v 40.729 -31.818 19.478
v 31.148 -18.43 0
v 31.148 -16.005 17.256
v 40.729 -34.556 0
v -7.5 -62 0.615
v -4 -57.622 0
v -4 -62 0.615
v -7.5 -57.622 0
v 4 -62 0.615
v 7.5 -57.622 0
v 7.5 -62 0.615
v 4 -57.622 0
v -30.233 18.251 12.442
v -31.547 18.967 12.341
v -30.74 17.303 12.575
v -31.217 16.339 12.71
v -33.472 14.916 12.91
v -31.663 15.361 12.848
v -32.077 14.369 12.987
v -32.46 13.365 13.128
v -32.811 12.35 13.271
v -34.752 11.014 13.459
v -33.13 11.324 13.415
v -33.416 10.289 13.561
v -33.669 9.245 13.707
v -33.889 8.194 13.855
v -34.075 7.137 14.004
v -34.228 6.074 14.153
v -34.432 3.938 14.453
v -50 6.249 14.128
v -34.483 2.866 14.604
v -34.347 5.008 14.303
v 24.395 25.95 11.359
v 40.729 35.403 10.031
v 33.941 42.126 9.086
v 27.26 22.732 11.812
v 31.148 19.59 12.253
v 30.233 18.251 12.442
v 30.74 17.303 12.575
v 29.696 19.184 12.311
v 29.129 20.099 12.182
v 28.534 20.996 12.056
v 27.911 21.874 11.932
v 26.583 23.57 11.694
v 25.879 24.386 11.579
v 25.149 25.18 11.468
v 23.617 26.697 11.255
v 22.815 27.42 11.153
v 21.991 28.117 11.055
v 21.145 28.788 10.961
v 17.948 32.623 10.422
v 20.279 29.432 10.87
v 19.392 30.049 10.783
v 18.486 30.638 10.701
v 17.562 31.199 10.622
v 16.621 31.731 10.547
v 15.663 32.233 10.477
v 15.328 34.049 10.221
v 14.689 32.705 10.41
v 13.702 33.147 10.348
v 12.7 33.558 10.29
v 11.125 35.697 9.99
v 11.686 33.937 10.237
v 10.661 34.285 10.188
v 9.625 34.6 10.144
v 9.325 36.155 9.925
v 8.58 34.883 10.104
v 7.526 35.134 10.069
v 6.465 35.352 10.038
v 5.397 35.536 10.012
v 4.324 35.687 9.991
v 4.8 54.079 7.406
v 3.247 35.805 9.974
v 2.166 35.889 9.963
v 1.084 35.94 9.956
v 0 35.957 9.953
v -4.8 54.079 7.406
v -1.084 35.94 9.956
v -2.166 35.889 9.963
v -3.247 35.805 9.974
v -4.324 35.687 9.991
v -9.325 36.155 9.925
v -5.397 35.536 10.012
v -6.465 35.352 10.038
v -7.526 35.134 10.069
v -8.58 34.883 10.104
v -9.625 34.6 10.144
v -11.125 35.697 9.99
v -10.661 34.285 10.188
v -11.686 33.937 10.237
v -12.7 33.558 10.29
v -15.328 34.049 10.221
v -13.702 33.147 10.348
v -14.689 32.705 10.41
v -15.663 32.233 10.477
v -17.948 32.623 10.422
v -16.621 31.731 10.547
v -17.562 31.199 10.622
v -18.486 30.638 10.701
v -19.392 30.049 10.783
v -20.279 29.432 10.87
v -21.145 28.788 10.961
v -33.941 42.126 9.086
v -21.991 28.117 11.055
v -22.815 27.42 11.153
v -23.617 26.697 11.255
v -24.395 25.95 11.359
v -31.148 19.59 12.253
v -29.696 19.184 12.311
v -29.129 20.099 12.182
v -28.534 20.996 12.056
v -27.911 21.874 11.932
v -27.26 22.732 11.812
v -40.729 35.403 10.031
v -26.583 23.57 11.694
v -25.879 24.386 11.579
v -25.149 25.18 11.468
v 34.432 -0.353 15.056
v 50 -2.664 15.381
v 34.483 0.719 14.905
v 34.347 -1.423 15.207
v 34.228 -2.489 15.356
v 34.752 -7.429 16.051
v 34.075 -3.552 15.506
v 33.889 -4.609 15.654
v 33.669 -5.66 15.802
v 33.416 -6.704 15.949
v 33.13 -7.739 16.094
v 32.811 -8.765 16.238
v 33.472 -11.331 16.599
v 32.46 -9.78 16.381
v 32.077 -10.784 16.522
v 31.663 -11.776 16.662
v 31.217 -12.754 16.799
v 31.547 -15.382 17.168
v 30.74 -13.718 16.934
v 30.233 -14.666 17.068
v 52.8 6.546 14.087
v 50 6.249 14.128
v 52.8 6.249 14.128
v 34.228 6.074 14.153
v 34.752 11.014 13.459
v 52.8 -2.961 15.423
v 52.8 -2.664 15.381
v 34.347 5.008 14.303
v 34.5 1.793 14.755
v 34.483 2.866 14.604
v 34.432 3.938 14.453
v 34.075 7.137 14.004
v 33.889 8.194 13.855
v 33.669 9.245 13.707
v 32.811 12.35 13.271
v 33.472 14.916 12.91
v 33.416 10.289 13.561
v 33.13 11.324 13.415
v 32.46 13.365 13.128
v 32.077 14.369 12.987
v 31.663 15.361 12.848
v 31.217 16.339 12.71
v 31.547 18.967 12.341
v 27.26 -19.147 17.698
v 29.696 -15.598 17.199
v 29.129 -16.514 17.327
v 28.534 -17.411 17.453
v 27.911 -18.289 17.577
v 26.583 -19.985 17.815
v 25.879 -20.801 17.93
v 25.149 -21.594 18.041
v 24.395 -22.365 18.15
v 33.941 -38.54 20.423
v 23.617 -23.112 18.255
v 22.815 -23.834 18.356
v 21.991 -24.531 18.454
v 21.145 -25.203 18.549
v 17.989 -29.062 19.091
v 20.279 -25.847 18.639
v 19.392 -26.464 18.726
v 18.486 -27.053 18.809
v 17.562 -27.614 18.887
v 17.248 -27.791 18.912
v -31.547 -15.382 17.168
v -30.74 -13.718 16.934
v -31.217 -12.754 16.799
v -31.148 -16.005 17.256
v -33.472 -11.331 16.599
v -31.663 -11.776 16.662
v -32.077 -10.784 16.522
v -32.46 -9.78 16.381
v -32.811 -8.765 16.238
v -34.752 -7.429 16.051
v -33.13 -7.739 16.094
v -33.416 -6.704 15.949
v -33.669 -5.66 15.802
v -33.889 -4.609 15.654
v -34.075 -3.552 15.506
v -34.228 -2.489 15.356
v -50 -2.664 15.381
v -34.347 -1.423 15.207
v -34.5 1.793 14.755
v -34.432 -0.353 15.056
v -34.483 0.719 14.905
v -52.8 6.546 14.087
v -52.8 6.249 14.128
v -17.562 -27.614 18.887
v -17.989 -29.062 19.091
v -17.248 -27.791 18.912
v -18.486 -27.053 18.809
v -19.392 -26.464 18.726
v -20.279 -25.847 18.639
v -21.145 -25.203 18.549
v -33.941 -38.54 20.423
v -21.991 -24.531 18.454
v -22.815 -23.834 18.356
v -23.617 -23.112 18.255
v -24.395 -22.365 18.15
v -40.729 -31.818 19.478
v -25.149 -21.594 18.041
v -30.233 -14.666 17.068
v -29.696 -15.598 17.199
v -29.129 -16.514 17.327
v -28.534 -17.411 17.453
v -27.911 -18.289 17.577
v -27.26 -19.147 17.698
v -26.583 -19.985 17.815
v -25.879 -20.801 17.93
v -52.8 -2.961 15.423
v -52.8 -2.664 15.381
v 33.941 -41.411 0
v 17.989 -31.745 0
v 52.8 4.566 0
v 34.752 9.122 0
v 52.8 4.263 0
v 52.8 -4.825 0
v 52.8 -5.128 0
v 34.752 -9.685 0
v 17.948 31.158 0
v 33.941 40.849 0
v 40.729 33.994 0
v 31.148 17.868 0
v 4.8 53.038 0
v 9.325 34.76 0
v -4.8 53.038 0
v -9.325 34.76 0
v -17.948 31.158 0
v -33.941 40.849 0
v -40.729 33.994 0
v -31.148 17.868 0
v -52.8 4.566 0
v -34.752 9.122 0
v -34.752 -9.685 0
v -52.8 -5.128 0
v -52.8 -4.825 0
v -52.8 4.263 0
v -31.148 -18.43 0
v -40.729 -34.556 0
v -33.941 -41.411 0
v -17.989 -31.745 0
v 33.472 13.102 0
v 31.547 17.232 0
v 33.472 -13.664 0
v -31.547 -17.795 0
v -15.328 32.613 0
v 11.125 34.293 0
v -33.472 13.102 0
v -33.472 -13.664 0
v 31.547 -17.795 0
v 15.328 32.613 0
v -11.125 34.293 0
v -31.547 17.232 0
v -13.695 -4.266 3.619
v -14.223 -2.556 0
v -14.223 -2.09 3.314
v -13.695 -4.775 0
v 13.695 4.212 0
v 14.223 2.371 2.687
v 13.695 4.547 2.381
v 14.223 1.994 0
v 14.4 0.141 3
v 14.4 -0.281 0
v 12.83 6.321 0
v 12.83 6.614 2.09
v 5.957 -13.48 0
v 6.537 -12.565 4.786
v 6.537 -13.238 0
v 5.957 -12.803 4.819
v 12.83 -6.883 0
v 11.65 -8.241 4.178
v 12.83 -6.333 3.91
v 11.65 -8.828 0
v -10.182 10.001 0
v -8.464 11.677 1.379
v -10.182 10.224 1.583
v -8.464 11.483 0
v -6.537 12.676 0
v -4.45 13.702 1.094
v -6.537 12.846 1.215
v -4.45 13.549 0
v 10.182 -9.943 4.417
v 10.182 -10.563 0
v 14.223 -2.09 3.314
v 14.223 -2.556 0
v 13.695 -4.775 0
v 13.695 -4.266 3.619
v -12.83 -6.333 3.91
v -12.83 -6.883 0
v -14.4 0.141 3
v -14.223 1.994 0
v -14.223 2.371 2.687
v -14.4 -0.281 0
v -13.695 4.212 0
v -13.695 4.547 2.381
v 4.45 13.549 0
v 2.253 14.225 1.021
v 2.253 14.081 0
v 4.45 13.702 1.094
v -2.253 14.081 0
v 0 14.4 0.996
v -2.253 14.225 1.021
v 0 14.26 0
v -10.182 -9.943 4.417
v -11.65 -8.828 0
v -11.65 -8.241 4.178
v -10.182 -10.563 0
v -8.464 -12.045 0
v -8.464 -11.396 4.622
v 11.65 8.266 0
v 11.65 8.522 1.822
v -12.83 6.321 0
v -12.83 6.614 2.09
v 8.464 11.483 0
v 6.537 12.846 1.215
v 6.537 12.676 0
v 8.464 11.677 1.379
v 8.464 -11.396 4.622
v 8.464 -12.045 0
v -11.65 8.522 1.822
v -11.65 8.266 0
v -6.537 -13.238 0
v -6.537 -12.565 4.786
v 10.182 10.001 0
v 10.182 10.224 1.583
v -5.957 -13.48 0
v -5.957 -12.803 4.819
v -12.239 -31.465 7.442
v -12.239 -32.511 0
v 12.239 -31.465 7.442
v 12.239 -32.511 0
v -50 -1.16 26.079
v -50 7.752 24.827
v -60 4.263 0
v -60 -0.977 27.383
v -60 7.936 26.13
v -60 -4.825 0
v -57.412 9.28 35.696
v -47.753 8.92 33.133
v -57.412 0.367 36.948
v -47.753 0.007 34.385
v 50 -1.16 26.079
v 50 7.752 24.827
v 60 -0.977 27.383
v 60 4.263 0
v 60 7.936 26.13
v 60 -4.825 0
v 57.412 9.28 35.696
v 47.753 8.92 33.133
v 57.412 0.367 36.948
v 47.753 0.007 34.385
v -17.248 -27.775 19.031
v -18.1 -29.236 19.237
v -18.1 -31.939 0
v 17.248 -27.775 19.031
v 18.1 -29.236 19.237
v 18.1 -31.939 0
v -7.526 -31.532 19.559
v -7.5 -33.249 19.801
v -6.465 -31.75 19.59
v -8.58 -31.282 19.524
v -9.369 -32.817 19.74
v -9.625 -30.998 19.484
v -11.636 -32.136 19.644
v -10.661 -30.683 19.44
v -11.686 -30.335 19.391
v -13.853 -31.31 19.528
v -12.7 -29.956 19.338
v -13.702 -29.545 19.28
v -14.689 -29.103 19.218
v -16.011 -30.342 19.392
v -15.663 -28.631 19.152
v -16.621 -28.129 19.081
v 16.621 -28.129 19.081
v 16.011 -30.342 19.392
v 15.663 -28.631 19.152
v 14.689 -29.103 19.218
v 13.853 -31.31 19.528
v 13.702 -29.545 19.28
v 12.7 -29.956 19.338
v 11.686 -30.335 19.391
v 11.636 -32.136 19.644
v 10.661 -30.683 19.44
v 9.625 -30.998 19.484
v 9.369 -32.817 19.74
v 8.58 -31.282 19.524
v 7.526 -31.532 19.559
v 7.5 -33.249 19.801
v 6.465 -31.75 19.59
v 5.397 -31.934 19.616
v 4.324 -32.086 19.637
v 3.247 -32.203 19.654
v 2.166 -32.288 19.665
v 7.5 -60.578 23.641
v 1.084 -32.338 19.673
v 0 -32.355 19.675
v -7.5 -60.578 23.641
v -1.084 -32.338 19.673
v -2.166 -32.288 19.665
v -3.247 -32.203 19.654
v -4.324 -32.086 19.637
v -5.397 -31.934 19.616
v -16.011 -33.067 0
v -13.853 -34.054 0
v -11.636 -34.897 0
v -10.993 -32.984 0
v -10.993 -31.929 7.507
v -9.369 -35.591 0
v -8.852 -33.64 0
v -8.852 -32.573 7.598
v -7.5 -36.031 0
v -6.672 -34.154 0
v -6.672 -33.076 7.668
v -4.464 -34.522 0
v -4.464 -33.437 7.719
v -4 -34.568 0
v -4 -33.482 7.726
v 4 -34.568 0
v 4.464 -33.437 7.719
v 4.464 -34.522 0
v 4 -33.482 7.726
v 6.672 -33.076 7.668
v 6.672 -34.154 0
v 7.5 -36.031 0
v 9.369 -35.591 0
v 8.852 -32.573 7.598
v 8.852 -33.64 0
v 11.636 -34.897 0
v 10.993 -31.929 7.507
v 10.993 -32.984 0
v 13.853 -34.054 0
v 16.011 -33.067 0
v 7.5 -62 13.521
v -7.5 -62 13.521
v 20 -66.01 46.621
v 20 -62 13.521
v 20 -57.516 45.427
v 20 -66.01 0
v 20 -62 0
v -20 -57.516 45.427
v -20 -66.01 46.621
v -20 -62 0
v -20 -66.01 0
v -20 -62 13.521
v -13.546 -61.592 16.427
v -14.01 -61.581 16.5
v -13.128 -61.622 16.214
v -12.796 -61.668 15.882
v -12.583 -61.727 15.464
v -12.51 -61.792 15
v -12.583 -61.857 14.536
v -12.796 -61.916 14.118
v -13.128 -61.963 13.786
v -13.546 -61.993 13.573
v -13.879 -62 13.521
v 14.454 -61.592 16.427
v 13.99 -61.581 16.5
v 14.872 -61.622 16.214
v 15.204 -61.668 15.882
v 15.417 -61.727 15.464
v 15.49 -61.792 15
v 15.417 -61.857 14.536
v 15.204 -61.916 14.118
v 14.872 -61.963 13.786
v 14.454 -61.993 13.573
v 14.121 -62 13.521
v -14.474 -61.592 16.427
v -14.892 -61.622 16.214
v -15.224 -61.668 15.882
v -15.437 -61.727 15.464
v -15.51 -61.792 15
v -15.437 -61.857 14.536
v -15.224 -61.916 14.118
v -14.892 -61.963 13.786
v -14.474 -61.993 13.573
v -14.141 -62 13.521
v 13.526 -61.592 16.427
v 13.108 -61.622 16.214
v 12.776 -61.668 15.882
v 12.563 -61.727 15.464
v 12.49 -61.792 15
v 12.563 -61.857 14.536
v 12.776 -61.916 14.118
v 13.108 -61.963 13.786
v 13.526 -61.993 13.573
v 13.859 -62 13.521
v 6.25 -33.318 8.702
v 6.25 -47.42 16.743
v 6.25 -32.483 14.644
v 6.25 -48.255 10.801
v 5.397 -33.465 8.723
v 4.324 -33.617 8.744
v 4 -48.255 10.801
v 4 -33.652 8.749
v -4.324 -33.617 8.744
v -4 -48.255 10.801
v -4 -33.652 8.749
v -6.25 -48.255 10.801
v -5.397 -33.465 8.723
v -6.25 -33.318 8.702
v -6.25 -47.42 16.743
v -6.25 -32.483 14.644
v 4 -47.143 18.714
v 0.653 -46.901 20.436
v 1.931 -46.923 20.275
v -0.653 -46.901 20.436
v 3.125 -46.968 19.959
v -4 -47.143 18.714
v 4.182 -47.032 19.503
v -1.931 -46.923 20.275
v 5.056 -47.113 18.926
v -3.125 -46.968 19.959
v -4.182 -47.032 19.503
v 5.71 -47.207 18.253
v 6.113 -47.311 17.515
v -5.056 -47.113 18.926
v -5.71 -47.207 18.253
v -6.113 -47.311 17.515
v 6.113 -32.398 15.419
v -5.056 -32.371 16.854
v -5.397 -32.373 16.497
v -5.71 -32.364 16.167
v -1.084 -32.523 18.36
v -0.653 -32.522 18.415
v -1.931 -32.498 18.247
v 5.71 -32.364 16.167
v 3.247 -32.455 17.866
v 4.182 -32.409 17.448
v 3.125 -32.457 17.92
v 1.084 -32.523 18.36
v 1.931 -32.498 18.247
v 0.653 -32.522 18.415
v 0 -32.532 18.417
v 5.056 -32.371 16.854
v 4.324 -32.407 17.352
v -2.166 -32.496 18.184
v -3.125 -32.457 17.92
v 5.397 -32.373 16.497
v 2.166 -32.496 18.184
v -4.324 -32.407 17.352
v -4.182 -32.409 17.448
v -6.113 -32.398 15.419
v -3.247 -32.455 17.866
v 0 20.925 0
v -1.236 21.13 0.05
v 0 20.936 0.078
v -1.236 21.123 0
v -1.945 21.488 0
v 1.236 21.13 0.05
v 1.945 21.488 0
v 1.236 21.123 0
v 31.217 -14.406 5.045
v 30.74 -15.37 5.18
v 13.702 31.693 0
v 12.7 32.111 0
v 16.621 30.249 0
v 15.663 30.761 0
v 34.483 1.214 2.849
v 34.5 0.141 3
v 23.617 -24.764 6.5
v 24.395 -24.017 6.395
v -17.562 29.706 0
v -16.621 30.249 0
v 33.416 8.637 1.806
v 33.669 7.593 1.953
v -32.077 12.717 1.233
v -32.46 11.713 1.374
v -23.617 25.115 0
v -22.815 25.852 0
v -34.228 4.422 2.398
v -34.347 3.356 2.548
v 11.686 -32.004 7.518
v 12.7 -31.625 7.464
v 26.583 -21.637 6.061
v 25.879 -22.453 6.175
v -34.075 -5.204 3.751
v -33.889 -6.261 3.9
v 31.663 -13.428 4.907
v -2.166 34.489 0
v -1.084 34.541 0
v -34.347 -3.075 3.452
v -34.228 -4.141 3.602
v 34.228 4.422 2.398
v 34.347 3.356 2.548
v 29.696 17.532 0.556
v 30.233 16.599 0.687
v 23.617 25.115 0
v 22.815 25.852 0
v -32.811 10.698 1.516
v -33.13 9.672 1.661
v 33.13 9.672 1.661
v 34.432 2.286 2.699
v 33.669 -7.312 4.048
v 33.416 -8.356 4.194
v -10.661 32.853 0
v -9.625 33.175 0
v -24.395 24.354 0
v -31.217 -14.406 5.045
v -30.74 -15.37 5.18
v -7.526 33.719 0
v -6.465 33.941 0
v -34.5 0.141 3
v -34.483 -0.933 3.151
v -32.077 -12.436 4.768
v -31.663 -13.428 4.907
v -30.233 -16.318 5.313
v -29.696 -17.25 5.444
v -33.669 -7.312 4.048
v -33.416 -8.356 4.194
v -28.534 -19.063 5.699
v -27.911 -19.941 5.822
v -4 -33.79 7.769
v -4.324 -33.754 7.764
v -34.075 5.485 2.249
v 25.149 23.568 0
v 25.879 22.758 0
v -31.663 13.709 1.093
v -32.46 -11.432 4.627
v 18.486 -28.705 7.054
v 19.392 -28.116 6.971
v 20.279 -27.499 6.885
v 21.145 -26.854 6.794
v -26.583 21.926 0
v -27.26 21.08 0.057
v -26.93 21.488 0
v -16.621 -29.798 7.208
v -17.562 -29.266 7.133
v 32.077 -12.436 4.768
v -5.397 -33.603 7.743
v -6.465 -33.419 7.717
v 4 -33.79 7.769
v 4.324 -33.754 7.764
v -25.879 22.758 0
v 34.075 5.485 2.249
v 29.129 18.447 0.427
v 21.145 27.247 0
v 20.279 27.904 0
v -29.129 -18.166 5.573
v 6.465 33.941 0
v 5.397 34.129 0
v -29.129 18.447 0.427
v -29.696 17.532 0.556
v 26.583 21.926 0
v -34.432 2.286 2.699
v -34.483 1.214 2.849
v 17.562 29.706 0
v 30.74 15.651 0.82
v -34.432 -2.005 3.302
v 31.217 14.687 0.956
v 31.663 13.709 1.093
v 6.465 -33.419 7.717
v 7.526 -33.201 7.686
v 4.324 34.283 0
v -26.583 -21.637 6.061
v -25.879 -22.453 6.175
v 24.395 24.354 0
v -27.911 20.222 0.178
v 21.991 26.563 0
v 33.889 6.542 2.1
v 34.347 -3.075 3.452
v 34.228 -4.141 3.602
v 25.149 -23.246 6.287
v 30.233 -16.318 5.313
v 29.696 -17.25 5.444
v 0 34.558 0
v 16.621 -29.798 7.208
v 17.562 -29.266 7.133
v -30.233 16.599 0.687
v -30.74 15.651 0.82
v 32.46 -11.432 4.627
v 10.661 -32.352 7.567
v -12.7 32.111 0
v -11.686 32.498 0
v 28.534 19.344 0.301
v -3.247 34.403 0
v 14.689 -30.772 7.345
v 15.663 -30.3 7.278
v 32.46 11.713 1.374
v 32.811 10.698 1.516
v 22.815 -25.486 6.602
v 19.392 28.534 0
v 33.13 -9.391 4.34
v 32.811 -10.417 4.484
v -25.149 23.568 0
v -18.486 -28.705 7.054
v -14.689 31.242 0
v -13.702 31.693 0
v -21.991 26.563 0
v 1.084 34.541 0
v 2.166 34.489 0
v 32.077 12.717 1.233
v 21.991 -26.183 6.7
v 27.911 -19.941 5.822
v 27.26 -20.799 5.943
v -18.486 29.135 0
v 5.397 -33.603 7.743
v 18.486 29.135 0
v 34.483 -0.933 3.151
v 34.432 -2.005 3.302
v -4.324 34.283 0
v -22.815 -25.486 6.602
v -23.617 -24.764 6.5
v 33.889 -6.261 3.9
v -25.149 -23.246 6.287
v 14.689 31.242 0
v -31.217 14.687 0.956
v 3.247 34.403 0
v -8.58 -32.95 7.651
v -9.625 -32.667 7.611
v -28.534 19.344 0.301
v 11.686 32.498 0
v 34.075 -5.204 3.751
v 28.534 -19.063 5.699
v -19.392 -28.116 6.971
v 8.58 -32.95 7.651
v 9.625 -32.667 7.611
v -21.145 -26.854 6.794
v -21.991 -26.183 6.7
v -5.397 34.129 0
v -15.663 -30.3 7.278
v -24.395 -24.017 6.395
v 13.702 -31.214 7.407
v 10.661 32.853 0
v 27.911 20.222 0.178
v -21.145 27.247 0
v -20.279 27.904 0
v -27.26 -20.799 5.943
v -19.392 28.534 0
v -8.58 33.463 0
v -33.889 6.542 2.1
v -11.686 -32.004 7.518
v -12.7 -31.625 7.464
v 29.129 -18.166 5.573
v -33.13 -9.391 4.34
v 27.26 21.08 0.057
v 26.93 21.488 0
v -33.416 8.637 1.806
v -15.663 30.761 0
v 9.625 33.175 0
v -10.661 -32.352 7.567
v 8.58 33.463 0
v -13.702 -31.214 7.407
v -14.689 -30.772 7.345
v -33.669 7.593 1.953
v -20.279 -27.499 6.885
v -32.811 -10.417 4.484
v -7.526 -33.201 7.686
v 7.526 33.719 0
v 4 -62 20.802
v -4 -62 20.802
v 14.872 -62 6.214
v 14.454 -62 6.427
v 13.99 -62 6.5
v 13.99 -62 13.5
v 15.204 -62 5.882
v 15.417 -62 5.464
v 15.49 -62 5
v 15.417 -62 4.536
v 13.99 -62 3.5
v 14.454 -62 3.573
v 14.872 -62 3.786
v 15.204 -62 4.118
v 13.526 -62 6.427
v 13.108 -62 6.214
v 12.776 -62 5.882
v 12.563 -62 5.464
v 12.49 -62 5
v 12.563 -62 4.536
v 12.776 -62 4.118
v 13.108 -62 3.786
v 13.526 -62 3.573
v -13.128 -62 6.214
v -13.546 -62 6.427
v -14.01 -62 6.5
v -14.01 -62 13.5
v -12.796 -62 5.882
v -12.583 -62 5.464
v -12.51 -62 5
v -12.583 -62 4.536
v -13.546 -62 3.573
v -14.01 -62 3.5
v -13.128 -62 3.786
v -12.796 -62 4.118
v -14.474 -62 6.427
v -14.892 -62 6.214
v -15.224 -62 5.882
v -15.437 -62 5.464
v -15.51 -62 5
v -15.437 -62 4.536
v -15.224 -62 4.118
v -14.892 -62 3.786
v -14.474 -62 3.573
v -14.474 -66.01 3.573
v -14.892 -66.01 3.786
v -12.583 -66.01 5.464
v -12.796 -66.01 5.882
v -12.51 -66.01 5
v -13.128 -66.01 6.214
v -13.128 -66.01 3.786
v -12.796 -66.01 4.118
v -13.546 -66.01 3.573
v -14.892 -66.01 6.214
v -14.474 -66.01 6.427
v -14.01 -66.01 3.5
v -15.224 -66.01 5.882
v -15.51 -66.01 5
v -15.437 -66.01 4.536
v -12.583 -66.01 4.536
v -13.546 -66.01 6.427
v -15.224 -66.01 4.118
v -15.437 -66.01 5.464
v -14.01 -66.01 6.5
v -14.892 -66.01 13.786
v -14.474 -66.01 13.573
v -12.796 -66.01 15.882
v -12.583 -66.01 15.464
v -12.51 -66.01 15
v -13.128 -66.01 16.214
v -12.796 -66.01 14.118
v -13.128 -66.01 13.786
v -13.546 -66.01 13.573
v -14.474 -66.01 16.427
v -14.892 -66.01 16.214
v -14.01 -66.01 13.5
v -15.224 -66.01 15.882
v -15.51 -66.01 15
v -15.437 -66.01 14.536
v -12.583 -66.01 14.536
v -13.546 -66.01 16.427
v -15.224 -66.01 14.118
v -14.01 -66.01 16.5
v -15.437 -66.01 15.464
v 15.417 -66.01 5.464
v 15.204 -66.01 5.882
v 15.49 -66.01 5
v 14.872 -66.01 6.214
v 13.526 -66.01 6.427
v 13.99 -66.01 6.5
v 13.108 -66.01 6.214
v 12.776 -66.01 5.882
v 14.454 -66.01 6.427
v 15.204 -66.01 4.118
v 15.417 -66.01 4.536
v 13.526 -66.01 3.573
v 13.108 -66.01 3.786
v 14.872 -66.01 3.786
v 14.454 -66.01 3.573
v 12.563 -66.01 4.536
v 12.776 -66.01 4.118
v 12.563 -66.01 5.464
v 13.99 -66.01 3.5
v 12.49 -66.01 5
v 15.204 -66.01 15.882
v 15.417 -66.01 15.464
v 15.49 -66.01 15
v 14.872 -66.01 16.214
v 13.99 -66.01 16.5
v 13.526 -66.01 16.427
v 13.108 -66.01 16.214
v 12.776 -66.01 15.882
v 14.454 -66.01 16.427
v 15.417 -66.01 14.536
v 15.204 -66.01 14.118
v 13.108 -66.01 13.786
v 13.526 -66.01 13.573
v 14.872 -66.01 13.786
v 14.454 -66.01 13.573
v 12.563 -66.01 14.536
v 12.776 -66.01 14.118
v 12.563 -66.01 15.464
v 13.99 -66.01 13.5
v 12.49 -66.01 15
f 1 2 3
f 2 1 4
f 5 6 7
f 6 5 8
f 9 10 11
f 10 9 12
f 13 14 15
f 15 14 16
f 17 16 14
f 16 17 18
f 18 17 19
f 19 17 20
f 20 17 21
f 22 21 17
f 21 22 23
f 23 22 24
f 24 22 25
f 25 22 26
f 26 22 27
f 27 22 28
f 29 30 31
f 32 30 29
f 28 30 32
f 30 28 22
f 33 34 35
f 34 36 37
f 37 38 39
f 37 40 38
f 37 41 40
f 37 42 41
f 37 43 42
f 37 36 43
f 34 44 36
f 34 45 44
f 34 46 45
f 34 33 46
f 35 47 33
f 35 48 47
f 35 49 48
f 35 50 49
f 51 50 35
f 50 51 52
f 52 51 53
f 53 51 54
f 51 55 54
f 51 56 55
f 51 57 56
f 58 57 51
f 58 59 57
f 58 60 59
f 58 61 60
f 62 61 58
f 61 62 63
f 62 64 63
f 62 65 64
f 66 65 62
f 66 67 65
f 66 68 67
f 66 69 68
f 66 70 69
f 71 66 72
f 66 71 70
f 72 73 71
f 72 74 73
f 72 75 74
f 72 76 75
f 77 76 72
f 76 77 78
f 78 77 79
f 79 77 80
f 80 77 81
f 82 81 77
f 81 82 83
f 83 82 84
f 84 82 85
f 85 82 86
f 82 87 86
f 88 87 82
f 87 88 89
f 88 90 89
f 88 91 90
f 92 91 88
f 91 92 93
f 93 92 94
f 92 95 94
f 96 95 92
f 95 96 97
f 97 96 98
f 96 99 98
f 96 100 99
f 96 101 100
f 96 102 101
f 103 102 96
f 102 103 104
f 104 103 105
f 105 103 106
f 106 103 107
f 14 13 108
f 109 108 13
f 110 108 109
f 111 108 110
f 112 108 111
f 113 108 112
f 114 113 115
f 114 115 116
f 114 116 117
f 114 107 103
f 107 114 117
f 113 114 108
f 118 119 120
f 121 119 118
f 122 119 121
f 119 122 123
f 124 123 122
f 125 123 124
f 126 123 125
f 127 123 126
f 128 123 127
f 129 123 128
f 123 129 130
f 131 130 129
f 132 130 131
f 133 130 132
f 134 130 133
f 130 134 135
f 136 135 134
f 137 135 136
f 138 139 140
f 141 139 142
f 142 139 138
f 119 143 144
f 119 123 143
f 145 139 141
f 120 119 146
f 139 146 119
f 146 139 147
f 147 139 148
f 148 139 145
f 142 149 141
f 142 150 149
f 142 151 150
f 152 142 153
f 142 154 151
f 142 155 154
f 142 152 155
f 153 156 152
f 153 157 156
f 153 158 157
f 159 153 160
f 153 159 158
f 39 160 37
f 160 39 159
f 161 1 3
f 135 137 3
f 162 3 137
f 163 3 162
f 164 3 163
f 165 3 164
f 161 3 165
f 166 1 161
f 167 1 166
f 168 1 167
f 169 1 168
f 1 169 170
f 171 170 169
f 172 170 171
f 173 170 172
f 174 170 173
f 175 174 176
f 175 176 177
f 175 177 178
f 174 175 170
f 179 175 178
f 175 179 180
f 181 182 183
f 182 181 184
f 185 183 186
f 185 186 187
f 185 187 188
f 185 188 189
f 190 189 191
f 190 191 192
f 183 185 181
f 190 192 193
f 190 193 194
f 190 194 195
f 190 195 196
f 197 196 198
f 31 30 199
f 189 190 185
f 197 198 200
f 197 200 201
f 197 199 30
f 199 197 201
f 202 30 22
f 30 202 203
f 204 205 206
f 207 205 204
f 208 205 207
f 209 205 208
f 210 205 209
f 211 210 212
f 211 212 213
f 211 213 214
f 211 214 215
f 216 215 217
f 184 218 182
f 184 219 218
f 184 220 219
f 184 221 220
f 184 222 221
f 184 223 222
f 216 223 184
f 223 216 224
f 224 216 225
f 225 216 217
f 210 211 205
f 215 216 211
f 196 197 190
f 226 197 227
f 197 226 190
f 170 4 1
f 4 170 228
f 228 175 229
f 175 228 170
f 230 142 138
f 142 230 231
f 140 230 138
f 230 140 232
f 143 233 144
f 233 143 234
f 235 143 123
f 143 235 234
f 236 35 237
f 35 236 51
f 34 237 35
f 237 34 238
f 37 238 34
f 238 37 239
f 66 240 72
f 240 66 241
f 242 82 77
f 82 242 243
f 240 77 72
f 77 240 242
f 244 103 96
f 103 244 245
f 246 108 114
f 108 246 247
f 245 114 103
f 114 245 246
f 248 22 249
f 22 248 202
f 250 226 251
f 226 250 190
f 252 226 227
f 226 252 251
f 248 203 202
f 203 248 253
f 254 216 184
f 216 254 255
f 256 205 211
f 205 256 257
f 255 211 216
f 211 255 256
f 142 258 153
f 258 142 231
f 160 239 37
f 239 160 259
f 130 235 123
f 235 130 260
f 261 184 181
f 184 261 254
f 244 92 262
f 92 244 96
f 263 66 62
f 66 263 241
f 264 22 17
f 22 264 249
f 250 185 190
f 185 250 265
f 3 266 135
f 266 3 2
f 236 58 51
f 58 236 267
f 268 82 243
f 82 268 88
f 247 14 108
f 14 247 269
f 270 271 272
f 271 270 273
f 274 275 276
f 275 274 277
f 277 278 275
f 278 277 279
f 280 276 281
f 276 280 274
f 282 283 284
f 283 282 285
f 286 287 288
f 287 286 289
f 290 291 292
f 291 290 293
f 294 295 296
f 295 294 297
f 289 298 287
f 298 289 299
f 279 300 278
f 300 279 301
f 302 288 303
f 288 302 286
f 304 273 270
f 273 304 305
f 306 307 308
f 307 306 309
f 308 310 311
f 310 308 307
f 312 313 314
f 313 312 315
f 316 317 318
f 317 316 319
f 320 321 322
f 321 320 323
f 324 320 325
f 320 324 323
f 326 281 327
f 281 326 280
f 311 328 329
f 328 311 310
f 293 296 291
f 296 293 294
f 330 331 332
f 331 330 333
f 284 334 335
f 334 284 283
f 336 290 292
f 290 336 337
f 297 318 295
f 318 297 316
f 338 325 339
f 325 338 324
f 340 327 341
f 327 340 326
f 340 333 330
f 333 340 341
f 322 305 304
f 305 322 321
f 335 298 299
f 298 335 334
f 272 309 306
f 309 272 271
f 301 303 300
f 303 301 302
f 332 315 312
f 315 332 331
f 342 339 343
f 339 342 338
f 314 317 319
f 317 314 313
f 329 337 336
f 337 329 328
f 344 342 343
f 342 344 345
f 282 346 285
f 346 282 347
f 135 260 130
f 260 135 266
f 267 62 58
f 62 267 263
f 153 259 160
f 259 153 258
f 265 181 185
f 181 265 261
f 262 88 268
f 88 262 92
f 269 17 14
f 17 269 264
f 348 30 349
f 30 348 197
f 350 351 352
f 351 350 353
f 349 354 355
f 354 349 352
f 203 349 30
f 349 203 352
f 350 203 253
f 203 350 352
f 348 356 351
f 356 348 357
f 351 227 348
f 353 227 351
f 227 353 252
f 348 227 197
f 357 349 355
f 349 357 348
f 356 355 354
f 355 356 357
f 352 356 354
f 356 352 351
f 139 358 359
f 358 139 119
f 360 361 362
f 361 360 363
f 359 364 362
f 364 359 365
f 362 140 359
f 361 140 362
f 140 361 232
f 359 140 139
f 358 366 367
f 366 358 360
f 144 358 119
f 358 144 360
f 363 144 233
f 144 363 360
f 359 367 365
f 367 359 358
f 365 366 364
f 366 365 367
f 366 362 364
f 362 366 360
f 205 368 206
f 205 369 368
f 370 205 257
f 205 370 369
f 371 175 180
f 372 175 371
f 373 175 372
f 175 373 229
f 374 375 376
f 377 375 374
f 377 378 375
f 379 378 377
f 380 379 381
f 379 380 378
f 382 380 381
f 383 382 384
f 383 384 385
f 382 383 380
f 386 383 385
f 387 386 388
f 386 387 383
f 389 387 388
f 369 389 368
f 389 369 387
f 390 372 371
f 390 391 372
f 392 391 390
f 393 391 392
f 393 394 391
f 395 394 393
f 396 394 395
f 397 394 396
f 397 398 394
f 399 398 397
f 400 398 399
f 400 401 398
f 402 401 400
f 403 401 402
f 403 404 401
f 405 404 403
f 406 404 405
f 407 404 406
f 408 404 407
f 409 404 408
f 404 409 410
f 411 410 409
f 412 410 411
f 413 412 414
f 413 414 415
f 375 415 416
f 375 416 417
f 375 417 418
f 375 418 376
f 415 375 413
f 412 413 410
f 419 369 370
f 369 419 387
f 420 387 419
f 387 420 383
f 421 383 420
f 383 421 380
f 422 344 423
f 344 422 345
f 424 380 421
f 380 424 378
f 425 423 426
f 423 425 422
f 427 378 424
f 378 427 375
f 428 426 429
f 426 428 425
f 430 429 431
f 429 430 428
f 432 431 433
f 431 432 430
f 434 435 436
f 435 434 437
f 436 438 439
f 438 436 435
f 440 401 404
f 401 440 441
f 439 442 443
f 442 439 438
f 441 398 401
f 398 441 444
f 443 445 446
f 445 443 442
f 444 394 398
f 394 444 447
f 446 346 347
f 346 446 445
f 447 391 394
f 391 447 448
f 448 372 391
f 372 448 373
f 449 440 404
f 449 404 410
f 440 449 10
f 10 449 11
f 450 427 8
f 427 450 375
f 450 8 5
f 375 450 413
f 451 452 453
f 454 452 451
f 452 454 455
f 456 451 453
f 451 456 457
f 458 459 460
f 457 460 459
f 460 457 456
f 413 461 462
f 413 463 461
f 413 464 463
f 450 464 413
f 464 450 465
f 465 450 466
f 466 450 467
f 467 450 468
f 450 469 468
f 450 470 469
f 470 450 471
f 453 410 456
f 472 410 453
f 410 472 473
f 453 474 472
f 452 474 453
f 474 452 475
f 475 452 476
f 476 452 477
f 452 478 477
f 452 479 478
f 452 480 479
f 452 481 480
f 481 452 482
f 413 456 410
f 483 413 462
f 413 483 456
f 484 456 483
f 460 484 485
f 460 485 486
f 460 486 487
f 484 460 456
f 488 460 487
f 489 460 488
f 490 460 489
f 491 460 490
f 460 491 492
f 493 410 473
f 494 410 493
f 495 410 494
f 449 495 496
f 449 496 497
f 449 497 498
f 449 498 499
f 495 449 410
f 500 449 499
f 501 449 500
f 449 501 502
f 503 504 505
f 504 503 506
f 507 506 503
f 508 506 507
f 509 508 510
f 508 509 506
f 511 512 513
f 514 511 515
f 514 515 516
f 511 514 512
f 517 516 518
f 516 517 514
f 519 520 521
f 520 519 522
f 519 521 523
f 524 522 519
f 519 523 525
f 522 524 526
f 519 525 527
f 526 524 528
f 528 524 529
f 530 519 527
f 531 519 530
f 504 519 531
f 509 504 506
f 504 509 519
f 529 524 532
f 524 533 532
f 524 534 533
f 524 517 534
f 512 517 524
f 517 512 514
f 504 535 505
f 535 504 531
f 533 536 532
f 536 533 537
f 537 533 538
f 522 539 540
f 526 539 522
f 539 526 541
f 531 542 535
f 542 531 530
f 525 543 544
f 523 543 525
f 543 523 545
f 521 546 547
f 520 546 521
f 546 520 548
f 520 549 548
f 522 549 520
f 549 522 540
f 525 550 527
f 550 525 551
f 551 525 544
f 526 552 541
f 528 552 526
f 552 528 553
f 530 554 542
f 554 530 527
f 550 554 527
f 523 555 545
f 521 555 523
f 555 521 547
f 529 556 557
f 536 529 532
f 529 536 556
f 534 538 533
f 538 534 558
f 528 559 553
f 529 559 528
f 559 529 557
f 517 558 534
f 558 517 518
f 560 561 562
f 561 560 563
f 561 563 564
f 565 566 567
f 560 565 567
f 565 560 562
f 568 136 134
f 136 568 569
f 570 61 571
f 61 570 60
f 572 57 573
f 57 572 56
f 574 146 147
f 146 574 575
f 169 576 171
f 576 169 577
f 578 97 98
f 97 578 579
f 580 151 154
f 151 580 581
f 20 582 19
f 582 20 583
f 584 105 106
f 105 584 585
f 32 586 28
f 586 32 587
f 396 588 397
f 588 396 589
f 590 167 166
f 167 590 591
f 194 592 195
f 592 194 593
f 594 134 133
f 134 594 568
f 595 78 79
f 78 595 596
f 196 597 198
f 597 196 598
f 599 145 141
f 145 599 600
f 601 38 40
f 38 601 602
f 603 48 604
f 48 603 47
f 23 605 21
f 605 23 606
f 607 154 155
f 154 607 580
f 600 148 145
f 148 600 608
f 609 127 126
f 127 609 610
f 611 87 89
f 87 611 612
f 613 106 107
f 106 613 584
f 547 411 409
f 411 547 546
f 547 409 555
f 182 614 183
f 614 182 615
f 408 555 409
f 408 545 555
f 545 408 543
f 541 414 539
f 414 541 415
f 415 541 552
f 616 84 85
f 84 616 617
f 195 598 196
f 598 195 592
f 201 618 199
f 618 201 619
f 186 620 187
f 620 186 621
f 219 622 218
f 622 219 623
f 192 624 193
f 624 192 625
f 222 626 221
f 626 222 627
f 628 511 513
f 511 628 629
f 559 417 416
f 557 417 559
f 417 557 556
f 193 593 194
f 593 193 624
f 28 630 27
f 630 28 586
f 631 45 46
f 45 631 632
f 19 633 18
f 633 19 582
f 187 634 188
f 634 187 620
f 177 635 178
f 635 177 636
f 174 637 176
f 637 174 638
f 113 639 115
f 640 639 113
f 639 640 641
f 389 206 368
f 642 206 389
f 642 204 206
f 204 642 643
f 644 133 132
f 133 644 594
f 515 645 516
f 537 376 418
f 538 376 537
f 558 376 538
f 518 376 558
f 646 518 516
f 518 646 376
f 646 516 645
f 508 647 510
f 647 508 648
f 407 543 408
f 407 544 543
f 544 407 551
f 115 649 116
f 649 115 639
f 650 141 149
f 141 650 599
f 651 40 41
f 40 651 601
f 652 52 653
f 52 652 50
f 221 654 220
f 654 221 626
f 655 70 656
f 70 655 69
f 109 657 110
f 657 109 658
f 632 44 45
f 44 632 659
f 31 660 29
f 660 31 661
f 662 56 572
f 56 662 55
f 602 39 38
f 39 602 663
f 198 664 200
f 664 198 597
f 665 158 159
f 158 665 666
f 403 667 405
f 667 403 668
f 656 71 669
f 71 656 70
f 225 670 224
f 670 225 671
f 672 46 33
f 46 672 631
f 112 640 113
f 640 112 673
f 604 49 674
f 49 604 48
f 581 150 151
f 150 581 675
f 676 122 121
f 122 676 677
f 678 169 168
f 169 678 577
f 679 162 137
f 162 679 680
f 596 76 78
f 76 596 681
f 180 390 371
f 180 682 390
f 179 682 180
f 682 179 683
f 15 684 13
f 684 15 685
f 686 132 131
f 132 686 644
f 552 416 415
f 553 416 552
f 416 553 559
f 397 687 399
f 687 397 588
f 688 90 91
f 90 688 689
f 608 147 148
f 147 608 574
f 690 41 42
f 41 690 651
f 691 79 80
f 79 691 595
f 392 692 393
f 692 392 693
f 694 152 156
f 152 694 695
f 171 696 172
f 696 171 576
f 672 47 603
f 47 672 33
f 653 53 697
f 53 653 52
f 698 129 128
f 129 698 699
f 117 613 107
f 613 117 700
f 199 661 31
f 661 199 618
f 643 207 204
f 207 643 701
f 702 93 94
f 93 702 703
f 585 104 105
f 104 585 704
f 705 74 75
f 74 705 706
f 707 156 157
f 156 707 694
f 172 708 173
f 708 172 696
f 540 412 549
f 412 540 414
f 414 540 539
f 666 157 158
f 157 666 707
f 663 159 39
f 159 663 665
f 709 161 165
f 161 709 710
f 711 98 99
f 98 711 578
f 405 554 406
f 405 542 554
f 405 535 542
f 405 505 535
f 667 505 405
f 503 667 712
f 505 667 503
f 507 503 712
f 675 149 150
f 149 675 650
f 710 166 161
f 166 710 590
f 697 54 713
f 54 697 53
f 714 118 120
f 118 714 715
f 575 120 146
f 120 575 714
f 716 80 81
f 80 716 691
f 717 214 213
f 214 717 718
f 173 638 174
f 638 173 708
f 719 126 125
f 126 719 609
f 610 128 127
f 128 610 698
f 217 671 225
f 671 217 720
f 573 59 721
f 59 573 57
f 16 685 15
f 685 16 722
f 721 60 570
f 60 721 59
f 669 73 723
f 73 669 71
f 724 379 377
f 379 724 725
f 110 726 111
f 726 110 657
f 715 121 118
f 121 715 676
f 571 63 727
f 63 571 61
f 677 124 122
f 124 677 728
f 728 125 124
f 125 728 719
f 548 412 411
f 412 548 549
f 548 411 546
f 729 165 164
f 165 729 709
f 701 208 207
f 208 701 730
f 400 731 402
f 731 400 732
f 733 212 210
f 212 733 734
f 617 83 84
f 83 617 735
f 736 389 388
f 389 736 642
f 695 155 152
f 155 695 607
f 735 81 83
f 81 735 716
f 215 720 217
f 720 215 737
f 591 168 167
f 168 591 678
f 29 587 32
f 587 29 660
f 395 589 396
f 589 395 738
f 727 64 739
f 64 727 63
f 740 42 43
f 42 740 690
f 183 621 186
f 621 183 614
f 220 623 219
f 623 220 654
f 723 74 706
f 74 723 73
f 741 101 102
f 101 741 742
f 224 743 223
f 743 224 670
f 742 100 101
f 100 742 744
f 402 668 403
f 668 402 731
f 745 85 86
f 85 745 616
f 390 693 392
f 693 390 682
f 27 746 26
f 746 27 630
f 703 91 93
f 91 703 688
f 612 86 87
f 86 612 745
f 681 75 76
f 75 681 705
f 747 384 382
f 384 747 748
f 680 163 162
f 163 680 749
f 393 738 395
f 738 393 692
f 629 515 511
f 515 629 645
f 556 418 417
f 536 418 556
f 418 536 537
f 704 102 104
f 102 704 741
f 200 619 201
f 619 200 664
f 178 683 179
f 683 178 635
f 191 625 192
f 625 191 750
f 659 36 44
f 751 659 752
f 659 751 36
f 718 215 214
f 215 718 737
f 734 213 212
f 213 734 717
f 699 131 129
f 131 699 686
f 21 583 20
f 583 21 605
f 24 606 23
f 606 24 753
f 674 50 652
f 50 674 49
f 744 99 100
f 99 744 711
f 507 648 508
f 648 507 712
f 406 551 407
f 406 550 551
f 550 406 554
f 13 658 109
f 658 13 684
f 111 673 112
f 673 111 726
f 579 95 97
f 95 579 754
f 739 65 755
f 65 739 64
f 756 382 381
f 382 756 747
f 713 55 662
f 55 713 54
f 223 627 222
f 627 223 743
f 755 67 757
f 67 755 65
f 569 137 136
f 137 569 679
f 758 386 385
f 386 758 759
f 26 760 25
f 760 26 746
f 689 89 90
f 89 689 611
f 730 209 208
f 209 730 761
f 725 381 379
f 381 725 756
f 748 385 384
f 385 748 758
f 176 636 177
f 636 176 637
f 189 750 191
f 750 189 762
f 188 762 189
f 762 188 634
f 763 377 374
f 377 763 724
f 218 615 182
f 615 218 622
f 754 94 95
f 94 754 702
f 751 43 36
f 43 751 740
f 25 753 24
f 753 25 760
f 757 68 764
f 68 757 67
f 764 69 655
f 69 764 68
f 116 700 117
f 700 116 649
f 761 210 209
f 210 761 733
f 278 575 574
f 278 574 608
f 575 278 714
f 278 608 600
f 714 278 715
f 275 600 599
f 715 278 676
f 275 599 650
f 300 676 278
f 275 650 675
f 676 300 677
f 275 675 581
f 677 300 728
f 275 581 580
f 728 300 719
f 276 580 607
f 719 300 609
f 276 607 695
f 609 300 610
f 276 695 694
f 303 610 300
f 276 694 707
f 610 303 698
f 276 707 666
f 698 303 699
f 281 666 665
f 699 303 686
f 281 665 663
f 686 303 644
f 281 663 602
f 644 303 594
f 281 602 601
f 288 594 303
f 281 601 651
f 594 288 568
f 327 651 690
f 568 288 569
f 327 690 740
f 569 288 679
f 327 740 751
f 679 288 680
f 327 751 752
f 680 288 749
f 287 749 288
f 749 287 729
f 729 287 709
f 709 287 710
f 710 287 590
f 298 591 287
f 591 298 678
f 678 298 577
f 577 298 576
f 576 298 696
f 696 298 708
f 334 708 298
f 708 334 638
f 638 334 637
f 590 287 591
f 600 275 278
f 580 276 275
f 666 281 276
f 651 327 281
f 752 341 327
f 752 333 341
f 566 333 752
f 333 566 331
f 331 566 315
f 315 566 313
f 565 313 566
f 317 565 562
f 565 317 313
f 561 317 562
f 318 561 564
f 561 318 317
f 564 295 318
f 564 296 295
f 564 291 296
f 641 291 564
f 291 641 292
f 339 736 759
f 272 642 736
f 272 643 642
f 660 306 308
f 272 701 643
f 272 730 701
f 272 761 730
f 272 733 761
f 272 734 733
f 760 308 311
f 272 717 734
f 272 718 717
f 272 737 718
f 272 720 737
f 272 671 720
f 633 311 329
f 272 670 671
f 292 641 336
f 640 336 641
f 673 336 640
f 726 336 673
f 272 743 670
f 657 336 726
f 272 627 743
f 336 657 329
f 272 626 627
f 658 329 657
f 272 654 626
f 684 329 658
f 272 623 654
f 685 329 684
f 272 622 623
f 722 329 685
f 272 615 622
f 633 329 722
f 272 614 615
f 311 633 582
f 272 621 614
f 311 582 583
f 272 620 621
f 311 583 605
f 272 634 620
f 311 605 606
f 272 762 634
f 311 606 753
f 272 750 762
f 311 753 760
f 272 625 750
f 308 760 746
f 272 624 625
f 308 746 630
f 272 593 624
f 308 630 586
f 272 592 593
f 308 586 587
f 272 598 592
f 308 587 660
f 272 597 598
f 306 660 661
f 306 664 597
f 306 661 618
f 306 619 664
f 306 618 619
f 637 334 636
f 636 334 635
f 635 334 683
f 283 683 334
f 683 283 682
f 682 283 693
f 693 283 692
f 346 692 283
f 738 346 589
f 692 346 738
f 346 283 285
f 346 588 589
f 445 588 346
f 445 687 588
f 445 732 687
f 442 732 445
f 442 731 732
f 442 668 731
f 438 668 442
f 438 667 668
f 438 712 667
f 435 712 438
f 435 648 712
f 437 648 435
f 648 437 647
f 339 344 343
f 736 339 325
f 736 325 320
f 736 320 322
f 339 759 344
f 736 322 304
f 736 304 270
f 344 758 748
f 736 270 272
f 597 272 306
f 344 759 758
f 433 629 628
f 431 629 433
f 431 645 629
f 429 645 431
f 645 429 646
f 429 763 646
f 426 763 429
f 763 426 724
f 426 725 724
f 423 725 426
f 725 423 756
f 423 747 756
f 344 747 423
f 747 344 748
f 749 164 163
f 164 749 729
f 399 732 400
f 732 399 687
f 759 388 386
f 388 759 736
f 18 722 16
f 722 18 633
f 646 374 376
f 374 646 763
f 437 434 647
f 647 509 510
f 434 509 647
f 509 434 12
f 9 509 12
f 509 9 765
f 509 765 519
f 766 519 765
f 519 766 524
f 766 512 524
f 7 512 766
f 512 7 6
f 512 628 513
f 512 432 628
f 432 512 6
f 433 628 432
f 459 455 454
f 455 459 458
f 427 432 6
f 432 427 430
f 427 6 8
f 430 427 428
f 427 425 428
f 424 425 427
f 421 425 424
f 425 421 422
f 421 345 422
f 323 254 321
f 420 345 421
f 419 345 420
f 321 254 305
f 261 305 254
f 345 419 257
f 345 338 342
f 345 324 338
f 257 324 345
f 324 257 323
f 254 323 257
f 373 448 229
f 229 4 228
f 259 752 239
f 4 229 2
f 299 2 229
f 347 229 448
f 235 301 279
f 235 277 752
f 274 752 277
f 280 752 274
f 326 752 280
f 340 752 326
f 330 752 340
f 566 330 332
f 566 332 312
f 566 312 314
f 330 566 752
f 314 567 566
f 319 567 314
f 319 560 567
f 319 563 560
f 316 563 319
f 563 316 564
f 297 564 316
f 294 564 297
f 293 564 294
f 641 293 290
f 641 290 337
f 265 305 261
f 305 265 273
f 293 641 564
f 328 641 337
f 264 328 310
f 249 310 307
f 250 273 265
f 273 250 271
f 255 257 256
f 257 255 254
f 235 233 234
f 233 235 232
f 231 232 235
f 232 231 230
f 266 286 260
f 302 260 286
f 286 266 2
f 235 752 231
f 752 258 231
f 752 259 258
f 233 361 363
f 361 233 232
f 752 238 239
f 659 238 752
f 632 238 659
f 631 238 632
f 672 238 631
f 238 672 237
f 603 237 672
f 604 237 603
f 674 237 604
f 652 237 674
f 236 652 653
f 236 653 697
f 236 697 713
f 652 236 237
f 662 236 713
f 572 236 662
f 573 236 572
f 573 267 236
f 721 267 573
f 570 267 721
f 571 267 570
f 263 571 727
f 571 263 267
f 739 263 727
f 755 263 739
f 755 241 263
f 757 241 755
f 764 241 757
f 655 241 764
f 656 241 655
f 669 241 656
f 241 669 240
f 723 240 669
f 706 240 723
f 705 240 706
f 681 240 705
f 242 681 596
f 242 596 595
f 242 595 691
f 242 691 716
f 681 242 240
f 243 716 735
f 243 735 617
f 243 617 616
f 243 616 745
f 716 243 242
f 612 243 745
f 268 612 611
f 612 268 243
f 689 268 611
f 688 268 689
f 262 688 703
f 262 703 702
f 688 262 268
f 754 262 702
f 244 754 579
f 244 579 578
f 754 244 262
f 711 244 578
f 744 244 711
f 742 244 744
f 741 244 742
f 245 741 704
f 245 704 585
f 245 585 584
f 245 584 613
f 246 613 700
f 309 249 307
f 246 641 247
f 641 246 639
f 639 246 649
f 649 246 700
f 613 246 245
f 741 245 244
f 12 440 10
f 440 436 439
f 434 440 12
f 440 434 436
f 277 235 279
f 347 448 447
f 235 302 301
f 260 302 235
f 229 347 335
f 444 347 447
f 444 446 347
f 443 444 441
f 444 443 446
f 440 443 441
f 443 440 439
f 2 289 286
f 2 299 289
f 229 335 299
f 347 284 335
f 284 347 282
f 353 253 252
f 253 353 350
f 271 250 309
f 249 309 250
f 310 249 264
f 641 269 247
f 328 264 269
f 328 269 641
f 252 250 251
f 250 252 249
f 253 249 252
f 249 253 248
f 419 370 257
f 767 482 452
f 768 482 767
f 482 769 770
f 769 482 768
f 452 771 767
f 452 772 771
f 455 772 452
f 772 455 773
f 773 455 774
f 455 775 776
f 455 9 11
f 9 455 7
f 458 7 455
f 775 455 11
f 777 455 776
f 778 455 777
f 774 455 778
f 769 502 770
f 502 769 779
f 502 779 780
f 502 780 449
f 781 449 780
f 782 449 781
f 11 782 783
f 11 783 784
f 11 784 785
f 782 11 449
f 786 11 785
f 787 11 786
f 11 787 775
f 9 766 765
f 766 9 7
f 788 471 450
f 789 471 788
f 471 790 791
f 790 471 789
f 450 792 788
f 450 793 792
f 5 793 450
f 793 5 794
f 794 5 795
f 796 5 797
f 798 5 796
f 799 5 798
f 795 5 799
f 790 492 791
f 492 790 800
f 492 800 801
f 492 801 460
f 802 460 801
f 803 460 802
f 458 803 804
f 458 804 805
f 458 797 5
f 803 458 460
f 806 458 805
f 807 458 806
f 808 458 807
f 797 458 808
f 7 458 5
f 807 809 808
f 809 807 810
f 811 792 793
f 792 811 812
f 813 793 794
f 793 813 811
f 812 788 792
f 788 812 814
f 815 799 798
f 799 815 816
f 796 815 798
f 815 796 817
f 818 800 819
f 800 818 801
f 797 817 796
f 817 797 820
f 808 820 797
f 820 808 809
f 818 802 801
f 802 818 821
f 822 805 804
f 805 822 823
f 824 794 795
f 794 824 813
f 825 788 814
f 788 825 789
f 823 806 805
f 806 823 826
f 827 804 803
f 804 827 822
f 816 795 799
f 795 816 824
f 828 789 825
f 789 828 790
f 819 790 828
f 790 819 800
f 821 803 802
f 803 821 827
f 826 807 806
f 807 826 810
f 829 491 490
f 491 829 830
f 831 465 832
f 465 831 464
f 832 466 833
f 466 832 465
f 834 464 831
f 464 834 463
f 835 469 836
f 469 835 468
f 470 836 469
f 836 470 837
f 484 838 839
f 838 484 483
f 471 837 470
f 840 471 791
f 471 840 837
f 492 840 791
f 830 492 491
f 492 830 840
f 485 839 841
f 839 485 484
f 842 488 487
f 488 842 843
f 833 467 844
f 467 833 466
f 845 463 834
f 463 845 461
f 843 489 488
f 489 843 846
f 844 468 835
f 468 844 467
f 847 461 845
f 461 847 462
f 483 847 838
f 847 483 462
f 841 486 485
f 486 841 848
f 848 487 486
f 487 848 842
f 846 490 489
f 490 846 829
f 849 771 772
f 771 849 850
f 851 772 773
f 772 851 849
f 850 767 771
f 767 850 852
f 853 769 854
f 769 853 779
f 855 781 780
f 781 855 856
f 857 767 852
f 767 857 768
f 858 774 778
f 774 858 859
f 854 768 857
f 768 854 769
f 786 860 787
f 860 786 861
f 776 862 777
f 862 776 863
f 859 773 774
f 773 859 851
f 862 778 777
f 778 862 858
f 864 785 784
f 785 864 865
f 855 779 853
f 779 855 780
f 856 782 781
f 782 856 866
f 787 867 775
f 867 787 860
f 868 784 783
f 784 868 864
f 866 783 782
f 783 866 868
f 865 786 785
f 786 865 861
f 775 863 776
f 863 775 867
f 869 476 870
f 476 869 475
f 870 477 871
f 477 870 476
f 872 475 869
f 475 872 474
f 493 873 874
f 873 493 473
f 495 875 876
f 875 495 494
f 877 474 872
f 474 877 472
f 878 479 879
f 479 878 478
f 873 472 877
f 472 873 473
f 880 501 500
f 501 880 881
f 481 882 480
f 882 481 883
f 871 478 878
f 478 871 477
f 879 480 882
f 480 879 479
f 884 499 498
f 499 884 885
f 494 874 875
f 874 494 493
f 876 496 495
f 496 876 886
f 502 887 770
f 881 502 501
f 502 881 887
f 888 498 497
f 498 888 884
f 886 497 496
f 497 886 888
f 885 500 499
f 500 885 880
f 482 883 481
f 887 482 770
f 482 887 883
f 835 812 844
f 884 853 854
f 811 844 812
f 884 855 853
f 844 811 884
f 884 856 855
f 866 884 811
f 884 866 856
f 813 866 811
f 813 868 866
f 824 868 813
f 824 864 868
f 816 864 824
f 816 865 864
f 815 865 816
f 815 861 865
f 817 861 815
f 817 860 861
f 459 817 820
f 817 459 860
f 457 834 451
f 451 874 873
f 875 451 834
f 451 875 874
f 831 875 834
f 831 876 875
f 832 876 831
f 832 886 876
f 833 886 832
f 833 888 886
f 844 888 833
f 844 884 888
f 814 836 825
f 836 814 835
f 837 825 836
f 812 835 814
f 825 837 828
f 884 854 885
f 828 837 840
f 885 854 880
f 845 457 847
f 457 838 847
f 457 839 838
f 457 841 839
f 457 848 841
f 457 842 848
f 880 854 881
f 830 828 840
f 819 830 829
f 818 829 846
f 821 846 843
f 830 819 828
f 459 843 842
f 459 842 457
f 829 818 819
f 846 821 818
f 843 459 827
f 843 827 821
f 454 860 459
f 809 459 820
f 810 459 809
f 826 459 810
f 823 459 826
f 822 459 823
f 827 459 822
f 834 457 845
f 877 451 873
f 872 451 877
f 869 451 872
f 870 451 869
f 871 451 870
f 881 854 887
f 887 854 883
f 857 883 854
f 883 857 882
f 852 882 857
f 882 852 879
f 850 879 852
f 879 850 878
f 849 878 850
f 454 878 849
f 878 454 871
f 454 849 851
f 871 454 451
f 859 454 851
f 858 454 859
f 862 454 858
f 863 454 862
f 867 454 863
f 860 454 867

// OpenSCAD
// file: OpenSourceGear.scad
dmain=30;
dteeth1=12;
dteeth2=dteeth1-2;
h=8;
dinner=12;
hteeth=10;
txt="open source hardware";
lang=270/len(txt);
if(!oshpart) scale([2,2,1]) osh_badge(1);

module osh_badge(text=0) {
difference(){
  osh_teeth();
  translate([0,0,-.01])cylinder(d=dmain,h=h+.02,$fn=50);
}
difference(){
  union(){
  cylinder(d=dmain,h=h,$fn=50);
  }
  translate([0,0,-.01]) {
    cylinder(d=dinner,h=h+.02,$fn=40);
  rotate([0,0,-90]) translate([dmain*.5+1,-6,0]) linear_extrude(h+.02) mirror([1,0]) polygon([[0,12],[12,8],[12,4],[0,0]]);
  }
  if(text)
    osh_text();
}
}

module osh_teeth()
{
  for(rot=[-225:45:45])
    rotate([0,0,rot+180])
    translate([dmain*.5-1,-4,0]) linear_extrude(h) polygon([[0,8],[8,6],[8,2],[0,0]]);
}
module osh_text()
{
  translate([0,0,h-.99]) linear_extrude(1) 
    for(i=[0:len(txt)])
    {
      ang=220-i*lang;
      translate([cos(ang)*9.5,sin(ang)*9.5])
      rotate([0,0,ang-90])
      text(txt[i],size=3,valign="baseline",halign="center",font="Courier");
    }
  }
 
// main file
part="stand";
pitch=-5; // Y Rotation
yaw=-8; // Y Rotation
oshpart="1";
include <OpenSourceGear.scad>;
if(part=="stand") stand();
else if(part=="bracket") rotate([-90,0]) bracket();
else if(part=="all") {
  color("blue") stand();
  color("green") bracket();
}
module stand(){
difference(){
  union(){
    translate([-20,-62,0]) mirror([0,1]) cube([40,10,35]);
translate([0,0,2]) rotate([yaw,0]) difference(){
  union(){
    translate([0,0,-10]) rotate([0,0,0]) scale([2.4,2.4,2.86]) osh_badge();
    for(m=[0,1]) mirror([m,0])
    translate([-60,-4.5,-5]) {
      cube([10,9,30]);
      translate([0,0,30]) rotate([0,15,0]) cube([10,9,10]);
    }
    translate([0,0,-10]) rotate([0,0,-120]) rotate_extrude(angle=60,$fn=100) { translate([34.2,0]) square([2,23]); }
    translate([-7.5,-65,-10]) cube([15,30.4,23]);
    translate([-20,-80,-10]) cube([40,17,45]);
  }
  translate([0,25,-.01]) cylinder(d=8,h=2.01,$fn=20);
  translate([0,0,1.01]) cylinder(d=69,h=12,$fn=200);
  translate([-4,-65.01,-10.01]) cube([8,32.01,20]);
  translate([-6.25,-49.01,2]) {
    translate([0,0,0]) cube([12.5,20.01,6]);
    translate([6.25,0,6]) rotate([-90,0]) scale([1,.6]) cylinder(d=12.5,h=16.01,$fn=30);
  }
}
}
  translate([-20.01,-68,-10]) mirror([0,1,0]) rotate([0,0]) cube(60);
translate([-60,-95,-30]) cube([120,200,30]);
translate([-.01,-66.01,-40]) rotate([90,0]) {
    *cylinder(d=117,h=2,$fn=200);
    translate([-20,0]) cube([110,90,2]);
  for(x=[-14,14],y=[45,55])
    translate([x,y,-8]) cylinder(d=3,h=10,$fn=20);
}
}
}
module bracket(){
translate([-.01,-66.01,-40]) rotate([90,0]) {
    *translate([30,-40]) cylinder(d=117,h=2,$fn=200);
  difference(){
    rotate([0,0,pitch]) {
      translate([-25,-20]) cube([120,65,4]);
      translate([-25,22,0]) cube([43,43,6]);
      intersection(){
        translate([-6,30,-24]) rotate([45,0]) cube([6,40,60]);
        translate([-6,22,0]) cube([6,50,50]);
      }
    }
    for(x=[-14,14],y=[45,55])
      translate([x,y,-3]) cylinder(d=3,h=10,$fn=20);
    translate([20,20,-.01]) rotate([0,0,-5]) cube([80,55,5.02]);
  }
}
}
